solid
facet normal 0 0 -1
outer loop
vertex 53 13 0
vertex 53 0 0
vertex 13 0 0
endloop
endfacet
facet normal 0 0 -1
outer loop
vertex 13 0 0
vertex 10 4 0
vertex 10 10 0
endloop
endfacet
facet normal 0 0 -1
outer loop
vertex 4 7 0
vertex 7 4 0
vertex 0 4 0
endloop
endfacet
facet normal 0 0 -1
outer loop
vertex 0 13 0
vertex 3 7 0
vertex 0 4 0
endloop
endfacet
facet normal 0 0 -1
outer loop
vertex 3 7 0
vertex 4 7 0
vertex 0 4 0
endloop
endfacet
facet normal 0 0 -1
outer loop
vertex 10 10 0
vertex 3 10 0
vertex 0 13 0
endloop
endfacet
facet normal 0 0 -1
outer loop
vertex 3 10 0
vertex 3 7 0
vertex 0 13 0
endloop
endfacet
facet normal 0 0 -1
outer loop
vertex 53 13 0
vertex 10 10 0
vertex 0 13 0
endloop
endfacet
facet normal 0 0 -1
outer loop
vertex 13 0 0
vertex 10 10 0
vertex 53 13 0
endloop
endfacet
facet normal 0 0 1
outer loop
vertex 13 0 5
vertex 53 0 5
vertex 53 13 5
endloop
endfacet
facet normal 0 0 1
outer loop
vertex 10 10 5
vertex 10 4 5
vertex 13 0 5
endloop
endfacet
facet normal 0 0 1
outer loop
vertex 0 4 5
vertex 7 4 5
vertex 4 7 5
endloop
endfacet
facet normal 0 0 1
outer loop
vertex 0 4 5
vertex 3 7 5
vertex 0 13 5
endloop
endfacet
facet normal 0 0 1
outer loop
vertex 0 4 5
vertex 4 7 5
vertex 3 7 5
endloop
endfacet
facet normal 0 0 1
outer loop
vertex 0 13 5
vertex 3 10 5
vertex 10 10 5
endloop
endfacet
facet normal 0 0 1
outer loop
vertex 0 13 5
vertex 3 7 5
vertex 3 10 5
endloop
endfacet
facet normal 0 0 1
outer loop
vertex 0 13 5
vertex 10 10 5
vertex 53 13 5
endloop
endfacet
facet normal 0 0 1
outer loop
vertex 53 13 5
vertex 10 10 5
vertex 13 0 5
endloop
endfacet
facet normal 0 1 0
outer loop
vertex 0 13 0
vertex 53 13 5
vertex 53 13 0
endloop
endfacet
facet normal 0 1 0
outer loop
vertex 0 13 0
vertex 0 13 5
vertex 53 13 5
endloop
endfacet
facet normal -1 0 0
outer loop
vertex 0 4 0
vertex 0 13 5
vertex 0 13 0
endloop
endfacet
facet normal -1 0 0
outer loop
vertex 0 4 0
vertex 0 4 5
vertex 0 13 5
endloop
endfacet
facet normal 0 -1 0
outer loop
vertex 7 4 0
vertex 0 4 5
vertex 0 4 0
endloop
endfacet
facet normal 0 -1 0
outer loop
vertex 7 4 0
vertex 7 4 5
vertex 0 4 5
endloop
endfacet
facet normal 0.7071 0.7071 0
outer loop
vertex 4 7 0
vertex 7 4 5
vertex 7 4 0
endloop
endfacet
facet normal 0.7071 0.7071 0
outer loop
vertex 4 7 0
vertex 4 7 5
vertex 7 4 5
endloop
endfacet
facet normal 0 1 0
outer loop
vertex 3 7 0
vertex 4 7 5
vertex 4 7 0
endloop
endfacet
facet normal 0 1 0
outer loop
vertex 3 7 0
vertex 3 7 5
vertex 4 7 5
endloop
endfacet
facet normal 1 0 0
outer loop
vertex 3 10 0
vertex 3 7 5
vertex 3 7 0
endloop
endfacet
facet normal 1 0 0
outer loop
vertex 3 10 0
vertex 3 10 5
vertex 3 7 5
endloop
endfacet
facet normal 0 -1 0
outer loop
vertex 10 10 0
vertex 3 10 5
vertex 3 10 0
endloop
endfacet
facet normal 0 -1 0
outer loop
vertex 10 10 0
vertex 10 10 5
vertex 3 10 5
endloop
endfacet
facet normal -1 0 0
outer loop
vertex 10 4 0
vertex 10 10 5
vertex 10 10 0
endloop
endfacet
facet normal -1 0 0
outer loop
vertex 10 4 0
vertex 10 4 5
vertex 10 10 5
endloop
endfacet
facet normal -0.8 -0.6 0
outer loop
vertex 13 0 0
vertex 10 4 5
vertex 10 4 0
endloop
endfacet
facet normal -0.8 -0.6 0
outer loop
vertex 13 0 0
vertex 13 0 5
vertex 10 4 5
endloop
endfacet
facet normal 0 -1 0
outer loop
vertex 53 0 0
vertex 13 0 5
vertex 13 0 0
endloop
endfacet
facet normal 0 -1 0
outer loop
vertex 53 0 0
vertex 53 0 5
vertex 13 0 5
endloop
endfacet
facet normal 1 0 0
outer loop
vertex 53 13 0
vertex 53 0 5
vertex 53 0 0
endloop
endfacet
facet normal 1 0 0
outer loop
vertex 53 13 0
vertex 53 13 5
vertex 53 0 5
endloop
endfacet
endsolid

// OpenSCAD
echo(version=version());
// 35mm & 32.6mm, each 30mm tall
// simple 2D -> 3D extrusion of a rectangle
color("red")
    translate([0, 0, 0])
        linear_extrude(height = 5) {
            difference() {
                square([53, 13], center = false);
                polygon ( points =
                    [[ 0, 0],
                    [ 0, 4],
                    [ 7, 4],
                    [ 4, 7],
                    [ 3, 7],
                    [ 3,10],
                    [10,10],
                    [10, 4],
                    [13, 0],
                    [ 0, 0]],

                convexity=10);
            }
        }
